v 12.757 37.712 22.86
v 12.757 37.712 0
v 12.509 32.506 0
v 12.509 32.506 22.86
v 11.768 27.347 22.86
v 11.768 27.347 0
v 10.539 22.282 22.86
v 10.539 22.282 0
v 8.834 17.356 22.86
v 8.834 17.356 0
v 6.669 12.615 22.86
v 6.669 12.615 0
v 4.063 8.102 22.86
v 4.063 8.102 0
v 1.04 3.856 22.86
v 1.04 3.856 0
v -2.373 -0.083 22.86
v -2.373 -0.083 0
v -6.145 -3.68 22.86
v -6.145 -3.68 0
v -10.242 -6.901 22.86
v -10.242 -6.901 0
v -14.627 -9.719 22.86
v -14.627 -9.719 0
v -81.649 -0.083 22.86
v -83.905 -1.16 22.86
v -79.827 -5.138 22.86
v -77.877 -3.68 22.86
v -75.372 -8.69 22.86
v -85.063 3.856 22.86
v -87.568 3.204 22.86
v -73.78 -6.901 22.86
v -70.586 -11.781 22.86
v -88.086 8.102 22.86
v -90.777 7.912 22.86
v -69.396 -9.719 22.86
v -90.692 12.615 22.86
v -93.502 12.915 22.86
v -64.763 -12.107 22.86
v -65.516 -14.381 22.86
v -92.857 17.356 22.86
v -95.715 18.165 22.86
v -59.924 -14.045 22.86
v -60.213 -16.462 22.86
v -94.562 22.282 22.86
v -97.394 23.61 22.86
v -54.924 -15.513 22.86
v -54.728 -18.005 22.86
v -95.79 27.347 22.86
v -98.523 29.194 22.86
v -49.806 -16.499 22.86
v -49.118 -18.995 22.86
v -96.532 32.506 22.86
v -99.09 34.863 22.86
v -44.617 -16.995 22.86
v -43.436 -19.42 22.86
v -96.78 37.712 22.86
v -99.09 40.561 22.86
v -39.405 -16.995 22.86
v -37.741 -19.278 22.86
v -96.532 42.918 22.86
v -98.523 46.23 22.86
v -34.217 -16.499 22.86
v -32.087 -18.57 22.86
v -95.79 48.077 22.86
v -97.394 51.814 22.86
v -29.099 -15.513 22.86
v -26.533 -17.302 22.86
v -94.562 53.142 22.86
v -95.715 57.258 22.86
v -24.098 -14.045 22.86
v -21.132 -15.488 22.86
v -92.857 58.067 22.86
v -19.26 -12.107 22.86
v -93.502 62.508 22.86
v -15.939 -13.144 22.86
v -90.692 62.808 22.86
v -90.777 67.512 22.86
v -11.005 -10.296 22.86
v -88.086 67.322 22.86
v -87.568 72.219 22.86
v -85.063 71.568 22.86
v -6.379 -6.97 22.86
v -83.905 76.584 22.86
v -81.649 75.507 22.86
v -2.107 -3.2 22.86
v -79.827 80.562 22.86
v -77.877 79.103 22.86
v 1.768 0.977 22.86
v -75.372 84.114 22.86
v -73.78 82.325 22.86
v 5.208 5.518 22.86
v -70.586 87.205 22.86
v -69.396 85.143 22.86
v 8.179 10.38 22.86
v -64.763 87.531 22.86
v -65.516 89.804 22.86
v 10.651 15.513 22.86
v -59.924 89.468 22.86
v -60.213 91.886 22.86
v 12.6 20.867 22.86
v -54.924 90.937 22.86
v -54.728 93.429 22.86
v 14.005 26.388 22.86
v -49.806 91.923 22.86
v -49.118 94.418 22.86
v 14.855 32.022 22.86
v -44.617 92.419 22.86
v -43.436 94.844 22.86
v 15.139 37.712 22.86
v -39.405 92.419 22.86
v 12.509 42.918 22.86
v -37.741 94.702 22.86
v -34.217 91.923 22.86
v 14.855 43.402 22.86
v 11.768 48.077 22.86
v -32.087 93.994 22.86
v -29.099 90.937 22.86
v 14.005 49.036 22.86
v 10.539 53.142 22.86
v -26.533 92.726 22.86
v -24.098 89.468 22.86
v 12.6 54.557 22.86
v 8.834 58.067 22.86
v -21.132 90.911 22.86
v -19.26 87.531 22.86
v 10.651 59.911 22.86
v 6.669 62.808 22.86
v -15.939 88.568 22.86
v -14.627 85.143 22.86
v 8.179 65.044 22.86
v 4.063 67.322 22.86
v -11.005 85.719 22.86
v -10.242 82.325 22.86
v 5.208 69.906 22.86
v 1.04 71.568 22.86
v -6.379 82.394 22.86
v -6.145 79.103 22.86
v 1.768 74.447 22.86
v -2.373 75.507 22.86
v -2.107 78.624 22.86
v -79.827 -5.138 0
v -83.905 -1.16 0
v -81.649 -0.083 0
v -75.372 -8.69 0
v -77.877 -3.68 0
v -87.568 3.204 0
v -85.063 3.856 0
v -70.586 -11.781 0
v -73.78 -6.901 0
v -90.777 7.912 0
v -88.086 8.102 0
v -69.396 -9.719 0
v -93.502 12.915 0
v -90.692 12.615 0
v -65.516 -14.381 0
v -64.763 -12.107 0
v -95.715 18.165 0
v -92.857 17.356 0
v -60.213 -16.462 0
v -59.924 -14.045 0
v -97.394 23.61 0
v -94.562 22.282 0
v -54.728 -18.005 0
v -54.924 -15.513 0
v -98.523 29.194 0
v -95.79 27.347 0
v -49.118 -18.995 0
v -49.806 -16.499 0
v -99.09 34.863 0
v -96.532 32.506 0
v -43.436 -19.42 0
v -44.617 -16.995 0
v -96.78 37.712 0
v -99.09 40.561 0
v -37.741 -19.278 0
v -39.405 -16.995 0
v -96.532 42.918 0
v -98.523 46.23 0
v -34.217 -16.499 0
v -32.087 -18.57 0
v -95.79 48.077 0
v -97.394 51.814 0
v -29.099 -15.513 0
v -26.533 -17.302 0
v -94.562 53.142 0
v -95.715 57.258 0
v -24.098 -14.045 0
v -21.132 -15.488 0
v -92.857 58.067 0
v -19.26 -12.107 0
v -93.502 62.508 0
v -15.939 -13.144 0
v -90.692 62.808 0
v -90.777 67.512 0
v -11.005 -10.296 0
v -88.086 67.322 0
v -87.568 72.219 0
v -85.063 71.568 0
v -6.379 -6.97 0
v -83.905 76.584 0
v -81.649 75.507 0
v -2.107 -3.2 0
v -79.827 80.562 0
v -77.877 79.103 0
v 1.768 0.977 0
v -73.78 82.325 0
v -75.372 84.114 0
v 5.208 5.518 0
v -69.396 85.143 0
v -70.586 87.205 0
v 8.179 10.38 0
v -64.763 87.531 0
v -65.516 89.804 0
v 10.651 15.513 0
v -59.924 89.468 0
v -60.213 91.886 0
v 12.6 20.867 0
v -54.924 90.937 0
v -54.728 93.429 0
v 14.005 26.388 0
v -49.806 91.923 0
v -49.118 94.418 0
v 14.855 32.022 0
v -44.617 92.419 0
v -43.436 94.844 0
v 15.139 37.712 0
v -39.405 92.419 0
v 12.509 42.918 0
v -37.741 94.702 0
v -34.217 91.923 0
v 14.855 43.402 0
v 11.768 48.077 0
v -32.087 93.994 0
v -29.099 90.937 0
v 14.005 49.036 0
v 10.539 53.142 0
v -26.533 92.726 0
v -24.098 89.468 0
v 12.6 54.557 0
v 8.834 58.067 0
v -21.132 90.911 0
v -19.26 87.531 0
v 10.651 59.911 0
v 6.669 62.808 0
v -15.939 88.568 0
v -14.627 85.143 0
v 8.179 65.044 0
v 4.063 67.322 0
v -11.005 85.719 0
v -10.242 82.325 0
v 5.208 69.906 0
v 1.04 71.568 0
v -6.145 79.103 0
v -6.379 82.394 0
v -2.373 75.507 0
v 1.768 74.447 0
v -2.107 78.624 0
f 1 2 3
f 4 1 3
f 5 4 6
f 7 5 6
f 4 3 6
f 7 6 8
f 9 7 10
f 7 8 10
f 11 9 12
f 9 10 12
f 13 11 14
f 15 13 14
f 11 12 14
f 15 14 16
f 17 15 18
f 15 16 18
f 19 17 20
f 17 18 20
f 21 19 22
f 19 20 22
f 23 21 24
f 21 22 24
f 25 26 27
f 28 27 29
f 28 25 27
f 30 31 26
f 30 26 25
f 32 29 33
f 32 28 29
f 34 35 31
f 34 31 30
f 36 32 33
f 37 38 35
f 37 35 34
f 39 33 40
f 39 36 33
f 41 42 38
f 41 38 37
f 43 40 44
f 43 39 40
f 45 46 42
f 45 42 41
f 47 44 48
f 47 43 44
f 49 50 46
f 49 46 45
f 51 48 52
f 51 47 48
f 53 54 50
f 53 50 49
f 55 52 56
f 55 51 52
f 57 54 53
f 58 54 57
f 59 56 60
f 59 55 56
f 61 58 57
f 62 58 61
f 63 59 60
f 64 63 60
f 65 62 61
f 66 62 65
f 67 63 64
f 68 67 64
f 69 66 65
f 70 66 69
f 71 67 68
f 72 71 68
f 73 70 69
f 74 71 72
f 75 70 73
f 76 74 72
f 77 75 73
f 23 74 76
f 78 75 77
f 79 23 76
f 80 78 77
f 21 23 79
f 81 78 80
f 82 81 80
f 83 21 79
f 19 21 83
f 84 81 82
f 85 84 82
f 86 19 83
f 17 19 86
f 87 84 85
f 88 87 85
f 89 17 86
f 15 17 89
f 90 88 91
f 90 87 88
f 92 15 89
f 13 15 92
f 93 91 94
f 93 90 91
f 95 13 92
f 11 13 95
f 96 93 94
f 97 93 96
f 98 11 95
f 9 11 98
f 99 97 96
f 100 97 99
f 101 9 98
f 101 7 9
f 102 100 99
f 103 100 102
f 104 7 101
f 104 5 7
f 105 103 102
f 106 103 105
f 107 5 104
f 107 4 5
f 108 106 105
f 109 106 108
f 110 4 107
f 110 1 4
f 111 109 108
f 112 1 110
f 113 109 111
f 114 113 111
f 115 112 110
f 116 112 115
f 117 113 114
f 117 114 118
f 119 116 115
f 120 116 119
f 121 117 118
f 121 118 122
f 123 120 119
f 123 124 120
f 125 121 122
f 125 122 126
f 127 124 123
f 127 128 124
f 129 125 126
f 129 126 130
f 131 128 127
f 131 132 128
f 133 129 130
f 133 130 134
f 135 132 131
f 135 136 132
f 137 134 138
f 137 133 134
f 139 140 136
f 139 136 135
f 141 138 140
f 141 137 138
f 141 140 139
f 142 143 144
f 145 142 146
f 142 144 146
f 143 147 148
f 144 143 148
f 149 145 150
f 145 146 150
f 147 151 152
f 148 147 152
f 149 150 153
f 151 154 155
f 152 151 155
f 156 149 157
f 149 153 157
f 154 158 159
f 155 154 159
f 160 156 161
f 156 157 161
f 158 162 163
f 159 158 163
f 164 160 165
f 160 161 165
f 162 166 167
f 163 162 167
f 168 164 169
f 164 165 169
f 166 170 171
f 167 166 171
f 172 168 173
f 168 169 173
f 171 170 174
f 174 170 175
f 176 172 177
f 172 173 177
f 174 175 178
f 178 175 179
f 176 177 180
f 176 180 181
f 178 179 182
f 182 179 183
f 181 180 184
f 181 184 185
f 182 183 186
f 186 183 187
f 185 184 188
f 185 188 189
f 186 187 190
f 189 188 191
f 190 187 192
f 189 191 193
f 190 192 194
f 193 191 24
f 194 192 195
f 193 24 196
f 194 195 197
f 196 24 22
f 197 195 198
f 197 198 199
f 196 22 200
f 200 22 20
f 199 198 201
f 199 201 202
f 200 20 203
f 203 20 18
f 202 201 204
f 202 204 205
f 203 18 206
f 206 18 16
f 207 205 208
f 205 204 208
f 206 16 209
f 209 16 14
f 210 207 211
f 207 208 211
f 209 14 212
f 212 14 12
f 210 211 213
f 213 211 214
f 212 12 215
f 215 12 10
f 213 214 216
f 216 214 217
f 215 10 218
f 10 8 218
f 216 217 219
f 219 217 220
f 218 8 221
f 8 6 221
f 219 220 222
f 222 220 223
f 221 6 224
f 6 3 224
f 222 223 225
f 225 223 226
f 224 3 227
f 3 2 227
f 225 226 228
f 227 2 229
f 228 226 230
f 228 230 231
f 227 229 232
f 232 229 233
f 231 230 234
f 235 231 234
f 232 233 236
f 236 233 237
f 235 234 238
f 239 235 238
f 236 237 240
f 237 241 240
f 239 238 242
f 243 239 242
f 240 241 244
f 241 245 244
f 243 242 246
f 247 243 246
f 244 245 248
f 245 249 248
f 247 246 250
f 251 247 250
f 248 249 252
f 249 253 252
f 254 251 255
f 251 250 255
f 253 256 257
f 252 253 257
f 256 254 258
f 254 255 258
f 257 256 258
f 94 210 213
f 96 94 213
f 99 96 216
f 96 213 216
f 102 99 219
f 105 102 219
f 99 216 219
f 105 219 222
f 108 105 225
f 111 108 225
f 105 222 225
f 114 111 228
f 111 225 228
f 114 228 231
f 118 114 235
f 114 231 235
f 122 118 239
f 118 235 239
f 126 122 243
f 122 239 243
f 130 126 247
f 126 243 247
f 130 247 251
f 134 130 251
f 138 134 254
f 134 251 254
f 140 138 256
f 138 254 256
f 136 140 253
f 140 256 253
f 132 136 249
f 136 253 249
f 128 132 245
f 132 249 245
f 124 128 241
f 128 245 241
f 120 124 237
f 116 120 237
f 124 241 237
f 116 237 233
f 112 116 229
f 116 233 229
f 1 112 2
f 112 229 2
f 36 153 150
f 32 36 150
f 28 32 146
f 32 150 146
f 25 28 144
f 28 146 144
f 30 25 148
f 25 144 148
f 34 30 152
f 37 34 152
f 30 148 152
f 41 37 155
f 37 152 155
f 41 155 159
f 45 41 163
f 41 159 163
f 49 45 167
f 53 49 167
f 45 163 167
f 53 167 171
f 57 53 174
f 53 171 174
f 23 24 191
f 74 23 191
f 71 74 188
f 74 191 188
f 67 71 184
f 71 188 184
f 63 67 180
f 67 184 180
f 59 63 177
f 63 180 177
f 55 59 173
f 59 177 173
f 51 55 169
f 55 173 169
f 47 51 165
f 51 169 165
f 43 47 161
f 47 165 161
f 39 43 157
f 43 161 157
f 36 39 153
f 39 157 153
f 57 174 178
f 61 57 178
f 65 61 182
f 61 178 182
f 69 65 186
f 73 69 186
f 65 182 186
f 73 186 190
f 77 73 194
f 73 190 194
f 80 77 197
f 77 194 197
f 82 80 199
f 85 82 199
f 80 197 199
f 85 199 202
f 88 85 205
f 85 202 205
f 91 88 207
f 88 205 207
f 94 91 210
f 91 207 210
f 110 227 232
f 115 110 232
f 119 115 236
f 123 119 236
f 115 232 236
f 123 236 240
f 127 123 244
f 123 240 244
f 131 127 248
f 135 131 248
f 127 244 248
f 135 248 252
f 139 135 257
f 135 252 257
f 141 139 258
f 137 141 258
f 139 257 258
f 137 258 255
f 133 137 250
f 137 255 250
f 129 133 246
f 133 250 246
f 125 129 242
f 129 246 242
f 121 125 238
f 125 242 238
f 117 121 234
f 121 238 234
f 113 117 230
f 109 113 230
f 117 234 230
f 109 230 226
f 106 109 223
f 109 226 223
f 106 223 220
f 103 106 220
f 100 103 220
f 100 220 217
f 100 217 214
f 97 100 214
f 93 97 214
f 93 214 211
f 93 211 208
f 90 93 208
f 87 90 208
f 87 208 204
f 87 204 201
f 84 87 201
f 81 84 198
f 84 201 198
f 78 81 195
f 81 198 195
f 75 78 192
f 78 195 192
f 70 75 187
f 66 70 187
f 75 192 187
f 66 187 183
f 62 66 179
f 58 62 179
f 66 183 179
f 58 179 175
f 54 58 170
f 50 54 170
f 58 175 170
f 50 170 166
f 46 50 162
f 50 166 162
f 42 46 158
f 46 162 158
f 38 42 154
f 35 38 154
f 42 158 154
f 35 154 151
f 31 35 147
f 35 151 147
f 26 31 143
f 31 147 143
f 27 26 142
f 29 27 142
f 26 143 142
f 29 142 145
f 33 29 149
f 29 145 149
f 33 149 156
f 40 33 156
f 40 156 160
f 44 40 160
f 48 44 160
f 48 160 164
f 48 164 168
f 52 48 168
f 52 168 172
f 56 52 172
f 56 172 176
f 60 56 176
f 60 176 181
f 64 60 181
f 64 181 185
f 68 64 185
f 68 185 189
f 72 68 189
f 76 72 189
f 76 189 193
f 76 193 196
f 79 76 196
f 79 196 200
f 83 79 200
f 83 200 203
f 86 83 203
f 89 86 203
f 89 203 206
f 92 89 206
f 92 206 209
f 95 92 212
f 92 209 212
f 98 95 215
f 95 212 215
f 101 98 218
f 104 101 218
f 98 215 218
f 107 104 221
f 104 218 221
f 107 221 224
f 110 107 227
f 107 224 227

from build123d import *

# Parameters (mm, degrees)
F0_R     = 38.1
F1_DEPTH = 15.24
F3_SCALE = 1.5


with BuildPart() as f1:
    # F0 (on Top) → F1 (new body)
    with BuildSketch(Plane.XY):
        with Locations((-42.0107929352, 37.7116280534)):
            Circle(F0_R)
        with BuildLine():
            ThreePointArc((-23.7545429352, 69.332380609), (-10.3900403795, 55.9678780534), (-5.4982929352, 37.7116280534))
            ThreePointArc((-5.4982929352, 37.7116280534), (-10.3900403795, 19.4553780534), (-23.7545429352, 6.0908754977))
            ThreePointArc((-23.7545429352, 6.0908754977), (-42.0107929352, 1.1991280534), (-60.2670429352, 6.0908754977))
            ThreePointArc((-60.2670429352, 6.0908754977), (-73.6315454908, 19.4553780534), (-78.5232929352, 37.7116280534))
            ThreePointArc((-78.5232929352, 37.7116280534), (-73.6315454908, 55.9678780534), (-60.2670429352, 69.332380609))
            ThreePointArc((-60.2670429352, 69.332380609), (-42.0107929352, 74.2241280534), (-23.7545429352, 69.332380609))
        make_face(mode=Mode.SUBTRACT)
    extrude(amount=F1_DEPTH)


with BuildPart() as f1_1:
    # F3: moved
    add(f1.part.scale(F3_SCALE).moved(Location((21.0048016161, -18.8555214554, 0))))


solid = f1_1.part
